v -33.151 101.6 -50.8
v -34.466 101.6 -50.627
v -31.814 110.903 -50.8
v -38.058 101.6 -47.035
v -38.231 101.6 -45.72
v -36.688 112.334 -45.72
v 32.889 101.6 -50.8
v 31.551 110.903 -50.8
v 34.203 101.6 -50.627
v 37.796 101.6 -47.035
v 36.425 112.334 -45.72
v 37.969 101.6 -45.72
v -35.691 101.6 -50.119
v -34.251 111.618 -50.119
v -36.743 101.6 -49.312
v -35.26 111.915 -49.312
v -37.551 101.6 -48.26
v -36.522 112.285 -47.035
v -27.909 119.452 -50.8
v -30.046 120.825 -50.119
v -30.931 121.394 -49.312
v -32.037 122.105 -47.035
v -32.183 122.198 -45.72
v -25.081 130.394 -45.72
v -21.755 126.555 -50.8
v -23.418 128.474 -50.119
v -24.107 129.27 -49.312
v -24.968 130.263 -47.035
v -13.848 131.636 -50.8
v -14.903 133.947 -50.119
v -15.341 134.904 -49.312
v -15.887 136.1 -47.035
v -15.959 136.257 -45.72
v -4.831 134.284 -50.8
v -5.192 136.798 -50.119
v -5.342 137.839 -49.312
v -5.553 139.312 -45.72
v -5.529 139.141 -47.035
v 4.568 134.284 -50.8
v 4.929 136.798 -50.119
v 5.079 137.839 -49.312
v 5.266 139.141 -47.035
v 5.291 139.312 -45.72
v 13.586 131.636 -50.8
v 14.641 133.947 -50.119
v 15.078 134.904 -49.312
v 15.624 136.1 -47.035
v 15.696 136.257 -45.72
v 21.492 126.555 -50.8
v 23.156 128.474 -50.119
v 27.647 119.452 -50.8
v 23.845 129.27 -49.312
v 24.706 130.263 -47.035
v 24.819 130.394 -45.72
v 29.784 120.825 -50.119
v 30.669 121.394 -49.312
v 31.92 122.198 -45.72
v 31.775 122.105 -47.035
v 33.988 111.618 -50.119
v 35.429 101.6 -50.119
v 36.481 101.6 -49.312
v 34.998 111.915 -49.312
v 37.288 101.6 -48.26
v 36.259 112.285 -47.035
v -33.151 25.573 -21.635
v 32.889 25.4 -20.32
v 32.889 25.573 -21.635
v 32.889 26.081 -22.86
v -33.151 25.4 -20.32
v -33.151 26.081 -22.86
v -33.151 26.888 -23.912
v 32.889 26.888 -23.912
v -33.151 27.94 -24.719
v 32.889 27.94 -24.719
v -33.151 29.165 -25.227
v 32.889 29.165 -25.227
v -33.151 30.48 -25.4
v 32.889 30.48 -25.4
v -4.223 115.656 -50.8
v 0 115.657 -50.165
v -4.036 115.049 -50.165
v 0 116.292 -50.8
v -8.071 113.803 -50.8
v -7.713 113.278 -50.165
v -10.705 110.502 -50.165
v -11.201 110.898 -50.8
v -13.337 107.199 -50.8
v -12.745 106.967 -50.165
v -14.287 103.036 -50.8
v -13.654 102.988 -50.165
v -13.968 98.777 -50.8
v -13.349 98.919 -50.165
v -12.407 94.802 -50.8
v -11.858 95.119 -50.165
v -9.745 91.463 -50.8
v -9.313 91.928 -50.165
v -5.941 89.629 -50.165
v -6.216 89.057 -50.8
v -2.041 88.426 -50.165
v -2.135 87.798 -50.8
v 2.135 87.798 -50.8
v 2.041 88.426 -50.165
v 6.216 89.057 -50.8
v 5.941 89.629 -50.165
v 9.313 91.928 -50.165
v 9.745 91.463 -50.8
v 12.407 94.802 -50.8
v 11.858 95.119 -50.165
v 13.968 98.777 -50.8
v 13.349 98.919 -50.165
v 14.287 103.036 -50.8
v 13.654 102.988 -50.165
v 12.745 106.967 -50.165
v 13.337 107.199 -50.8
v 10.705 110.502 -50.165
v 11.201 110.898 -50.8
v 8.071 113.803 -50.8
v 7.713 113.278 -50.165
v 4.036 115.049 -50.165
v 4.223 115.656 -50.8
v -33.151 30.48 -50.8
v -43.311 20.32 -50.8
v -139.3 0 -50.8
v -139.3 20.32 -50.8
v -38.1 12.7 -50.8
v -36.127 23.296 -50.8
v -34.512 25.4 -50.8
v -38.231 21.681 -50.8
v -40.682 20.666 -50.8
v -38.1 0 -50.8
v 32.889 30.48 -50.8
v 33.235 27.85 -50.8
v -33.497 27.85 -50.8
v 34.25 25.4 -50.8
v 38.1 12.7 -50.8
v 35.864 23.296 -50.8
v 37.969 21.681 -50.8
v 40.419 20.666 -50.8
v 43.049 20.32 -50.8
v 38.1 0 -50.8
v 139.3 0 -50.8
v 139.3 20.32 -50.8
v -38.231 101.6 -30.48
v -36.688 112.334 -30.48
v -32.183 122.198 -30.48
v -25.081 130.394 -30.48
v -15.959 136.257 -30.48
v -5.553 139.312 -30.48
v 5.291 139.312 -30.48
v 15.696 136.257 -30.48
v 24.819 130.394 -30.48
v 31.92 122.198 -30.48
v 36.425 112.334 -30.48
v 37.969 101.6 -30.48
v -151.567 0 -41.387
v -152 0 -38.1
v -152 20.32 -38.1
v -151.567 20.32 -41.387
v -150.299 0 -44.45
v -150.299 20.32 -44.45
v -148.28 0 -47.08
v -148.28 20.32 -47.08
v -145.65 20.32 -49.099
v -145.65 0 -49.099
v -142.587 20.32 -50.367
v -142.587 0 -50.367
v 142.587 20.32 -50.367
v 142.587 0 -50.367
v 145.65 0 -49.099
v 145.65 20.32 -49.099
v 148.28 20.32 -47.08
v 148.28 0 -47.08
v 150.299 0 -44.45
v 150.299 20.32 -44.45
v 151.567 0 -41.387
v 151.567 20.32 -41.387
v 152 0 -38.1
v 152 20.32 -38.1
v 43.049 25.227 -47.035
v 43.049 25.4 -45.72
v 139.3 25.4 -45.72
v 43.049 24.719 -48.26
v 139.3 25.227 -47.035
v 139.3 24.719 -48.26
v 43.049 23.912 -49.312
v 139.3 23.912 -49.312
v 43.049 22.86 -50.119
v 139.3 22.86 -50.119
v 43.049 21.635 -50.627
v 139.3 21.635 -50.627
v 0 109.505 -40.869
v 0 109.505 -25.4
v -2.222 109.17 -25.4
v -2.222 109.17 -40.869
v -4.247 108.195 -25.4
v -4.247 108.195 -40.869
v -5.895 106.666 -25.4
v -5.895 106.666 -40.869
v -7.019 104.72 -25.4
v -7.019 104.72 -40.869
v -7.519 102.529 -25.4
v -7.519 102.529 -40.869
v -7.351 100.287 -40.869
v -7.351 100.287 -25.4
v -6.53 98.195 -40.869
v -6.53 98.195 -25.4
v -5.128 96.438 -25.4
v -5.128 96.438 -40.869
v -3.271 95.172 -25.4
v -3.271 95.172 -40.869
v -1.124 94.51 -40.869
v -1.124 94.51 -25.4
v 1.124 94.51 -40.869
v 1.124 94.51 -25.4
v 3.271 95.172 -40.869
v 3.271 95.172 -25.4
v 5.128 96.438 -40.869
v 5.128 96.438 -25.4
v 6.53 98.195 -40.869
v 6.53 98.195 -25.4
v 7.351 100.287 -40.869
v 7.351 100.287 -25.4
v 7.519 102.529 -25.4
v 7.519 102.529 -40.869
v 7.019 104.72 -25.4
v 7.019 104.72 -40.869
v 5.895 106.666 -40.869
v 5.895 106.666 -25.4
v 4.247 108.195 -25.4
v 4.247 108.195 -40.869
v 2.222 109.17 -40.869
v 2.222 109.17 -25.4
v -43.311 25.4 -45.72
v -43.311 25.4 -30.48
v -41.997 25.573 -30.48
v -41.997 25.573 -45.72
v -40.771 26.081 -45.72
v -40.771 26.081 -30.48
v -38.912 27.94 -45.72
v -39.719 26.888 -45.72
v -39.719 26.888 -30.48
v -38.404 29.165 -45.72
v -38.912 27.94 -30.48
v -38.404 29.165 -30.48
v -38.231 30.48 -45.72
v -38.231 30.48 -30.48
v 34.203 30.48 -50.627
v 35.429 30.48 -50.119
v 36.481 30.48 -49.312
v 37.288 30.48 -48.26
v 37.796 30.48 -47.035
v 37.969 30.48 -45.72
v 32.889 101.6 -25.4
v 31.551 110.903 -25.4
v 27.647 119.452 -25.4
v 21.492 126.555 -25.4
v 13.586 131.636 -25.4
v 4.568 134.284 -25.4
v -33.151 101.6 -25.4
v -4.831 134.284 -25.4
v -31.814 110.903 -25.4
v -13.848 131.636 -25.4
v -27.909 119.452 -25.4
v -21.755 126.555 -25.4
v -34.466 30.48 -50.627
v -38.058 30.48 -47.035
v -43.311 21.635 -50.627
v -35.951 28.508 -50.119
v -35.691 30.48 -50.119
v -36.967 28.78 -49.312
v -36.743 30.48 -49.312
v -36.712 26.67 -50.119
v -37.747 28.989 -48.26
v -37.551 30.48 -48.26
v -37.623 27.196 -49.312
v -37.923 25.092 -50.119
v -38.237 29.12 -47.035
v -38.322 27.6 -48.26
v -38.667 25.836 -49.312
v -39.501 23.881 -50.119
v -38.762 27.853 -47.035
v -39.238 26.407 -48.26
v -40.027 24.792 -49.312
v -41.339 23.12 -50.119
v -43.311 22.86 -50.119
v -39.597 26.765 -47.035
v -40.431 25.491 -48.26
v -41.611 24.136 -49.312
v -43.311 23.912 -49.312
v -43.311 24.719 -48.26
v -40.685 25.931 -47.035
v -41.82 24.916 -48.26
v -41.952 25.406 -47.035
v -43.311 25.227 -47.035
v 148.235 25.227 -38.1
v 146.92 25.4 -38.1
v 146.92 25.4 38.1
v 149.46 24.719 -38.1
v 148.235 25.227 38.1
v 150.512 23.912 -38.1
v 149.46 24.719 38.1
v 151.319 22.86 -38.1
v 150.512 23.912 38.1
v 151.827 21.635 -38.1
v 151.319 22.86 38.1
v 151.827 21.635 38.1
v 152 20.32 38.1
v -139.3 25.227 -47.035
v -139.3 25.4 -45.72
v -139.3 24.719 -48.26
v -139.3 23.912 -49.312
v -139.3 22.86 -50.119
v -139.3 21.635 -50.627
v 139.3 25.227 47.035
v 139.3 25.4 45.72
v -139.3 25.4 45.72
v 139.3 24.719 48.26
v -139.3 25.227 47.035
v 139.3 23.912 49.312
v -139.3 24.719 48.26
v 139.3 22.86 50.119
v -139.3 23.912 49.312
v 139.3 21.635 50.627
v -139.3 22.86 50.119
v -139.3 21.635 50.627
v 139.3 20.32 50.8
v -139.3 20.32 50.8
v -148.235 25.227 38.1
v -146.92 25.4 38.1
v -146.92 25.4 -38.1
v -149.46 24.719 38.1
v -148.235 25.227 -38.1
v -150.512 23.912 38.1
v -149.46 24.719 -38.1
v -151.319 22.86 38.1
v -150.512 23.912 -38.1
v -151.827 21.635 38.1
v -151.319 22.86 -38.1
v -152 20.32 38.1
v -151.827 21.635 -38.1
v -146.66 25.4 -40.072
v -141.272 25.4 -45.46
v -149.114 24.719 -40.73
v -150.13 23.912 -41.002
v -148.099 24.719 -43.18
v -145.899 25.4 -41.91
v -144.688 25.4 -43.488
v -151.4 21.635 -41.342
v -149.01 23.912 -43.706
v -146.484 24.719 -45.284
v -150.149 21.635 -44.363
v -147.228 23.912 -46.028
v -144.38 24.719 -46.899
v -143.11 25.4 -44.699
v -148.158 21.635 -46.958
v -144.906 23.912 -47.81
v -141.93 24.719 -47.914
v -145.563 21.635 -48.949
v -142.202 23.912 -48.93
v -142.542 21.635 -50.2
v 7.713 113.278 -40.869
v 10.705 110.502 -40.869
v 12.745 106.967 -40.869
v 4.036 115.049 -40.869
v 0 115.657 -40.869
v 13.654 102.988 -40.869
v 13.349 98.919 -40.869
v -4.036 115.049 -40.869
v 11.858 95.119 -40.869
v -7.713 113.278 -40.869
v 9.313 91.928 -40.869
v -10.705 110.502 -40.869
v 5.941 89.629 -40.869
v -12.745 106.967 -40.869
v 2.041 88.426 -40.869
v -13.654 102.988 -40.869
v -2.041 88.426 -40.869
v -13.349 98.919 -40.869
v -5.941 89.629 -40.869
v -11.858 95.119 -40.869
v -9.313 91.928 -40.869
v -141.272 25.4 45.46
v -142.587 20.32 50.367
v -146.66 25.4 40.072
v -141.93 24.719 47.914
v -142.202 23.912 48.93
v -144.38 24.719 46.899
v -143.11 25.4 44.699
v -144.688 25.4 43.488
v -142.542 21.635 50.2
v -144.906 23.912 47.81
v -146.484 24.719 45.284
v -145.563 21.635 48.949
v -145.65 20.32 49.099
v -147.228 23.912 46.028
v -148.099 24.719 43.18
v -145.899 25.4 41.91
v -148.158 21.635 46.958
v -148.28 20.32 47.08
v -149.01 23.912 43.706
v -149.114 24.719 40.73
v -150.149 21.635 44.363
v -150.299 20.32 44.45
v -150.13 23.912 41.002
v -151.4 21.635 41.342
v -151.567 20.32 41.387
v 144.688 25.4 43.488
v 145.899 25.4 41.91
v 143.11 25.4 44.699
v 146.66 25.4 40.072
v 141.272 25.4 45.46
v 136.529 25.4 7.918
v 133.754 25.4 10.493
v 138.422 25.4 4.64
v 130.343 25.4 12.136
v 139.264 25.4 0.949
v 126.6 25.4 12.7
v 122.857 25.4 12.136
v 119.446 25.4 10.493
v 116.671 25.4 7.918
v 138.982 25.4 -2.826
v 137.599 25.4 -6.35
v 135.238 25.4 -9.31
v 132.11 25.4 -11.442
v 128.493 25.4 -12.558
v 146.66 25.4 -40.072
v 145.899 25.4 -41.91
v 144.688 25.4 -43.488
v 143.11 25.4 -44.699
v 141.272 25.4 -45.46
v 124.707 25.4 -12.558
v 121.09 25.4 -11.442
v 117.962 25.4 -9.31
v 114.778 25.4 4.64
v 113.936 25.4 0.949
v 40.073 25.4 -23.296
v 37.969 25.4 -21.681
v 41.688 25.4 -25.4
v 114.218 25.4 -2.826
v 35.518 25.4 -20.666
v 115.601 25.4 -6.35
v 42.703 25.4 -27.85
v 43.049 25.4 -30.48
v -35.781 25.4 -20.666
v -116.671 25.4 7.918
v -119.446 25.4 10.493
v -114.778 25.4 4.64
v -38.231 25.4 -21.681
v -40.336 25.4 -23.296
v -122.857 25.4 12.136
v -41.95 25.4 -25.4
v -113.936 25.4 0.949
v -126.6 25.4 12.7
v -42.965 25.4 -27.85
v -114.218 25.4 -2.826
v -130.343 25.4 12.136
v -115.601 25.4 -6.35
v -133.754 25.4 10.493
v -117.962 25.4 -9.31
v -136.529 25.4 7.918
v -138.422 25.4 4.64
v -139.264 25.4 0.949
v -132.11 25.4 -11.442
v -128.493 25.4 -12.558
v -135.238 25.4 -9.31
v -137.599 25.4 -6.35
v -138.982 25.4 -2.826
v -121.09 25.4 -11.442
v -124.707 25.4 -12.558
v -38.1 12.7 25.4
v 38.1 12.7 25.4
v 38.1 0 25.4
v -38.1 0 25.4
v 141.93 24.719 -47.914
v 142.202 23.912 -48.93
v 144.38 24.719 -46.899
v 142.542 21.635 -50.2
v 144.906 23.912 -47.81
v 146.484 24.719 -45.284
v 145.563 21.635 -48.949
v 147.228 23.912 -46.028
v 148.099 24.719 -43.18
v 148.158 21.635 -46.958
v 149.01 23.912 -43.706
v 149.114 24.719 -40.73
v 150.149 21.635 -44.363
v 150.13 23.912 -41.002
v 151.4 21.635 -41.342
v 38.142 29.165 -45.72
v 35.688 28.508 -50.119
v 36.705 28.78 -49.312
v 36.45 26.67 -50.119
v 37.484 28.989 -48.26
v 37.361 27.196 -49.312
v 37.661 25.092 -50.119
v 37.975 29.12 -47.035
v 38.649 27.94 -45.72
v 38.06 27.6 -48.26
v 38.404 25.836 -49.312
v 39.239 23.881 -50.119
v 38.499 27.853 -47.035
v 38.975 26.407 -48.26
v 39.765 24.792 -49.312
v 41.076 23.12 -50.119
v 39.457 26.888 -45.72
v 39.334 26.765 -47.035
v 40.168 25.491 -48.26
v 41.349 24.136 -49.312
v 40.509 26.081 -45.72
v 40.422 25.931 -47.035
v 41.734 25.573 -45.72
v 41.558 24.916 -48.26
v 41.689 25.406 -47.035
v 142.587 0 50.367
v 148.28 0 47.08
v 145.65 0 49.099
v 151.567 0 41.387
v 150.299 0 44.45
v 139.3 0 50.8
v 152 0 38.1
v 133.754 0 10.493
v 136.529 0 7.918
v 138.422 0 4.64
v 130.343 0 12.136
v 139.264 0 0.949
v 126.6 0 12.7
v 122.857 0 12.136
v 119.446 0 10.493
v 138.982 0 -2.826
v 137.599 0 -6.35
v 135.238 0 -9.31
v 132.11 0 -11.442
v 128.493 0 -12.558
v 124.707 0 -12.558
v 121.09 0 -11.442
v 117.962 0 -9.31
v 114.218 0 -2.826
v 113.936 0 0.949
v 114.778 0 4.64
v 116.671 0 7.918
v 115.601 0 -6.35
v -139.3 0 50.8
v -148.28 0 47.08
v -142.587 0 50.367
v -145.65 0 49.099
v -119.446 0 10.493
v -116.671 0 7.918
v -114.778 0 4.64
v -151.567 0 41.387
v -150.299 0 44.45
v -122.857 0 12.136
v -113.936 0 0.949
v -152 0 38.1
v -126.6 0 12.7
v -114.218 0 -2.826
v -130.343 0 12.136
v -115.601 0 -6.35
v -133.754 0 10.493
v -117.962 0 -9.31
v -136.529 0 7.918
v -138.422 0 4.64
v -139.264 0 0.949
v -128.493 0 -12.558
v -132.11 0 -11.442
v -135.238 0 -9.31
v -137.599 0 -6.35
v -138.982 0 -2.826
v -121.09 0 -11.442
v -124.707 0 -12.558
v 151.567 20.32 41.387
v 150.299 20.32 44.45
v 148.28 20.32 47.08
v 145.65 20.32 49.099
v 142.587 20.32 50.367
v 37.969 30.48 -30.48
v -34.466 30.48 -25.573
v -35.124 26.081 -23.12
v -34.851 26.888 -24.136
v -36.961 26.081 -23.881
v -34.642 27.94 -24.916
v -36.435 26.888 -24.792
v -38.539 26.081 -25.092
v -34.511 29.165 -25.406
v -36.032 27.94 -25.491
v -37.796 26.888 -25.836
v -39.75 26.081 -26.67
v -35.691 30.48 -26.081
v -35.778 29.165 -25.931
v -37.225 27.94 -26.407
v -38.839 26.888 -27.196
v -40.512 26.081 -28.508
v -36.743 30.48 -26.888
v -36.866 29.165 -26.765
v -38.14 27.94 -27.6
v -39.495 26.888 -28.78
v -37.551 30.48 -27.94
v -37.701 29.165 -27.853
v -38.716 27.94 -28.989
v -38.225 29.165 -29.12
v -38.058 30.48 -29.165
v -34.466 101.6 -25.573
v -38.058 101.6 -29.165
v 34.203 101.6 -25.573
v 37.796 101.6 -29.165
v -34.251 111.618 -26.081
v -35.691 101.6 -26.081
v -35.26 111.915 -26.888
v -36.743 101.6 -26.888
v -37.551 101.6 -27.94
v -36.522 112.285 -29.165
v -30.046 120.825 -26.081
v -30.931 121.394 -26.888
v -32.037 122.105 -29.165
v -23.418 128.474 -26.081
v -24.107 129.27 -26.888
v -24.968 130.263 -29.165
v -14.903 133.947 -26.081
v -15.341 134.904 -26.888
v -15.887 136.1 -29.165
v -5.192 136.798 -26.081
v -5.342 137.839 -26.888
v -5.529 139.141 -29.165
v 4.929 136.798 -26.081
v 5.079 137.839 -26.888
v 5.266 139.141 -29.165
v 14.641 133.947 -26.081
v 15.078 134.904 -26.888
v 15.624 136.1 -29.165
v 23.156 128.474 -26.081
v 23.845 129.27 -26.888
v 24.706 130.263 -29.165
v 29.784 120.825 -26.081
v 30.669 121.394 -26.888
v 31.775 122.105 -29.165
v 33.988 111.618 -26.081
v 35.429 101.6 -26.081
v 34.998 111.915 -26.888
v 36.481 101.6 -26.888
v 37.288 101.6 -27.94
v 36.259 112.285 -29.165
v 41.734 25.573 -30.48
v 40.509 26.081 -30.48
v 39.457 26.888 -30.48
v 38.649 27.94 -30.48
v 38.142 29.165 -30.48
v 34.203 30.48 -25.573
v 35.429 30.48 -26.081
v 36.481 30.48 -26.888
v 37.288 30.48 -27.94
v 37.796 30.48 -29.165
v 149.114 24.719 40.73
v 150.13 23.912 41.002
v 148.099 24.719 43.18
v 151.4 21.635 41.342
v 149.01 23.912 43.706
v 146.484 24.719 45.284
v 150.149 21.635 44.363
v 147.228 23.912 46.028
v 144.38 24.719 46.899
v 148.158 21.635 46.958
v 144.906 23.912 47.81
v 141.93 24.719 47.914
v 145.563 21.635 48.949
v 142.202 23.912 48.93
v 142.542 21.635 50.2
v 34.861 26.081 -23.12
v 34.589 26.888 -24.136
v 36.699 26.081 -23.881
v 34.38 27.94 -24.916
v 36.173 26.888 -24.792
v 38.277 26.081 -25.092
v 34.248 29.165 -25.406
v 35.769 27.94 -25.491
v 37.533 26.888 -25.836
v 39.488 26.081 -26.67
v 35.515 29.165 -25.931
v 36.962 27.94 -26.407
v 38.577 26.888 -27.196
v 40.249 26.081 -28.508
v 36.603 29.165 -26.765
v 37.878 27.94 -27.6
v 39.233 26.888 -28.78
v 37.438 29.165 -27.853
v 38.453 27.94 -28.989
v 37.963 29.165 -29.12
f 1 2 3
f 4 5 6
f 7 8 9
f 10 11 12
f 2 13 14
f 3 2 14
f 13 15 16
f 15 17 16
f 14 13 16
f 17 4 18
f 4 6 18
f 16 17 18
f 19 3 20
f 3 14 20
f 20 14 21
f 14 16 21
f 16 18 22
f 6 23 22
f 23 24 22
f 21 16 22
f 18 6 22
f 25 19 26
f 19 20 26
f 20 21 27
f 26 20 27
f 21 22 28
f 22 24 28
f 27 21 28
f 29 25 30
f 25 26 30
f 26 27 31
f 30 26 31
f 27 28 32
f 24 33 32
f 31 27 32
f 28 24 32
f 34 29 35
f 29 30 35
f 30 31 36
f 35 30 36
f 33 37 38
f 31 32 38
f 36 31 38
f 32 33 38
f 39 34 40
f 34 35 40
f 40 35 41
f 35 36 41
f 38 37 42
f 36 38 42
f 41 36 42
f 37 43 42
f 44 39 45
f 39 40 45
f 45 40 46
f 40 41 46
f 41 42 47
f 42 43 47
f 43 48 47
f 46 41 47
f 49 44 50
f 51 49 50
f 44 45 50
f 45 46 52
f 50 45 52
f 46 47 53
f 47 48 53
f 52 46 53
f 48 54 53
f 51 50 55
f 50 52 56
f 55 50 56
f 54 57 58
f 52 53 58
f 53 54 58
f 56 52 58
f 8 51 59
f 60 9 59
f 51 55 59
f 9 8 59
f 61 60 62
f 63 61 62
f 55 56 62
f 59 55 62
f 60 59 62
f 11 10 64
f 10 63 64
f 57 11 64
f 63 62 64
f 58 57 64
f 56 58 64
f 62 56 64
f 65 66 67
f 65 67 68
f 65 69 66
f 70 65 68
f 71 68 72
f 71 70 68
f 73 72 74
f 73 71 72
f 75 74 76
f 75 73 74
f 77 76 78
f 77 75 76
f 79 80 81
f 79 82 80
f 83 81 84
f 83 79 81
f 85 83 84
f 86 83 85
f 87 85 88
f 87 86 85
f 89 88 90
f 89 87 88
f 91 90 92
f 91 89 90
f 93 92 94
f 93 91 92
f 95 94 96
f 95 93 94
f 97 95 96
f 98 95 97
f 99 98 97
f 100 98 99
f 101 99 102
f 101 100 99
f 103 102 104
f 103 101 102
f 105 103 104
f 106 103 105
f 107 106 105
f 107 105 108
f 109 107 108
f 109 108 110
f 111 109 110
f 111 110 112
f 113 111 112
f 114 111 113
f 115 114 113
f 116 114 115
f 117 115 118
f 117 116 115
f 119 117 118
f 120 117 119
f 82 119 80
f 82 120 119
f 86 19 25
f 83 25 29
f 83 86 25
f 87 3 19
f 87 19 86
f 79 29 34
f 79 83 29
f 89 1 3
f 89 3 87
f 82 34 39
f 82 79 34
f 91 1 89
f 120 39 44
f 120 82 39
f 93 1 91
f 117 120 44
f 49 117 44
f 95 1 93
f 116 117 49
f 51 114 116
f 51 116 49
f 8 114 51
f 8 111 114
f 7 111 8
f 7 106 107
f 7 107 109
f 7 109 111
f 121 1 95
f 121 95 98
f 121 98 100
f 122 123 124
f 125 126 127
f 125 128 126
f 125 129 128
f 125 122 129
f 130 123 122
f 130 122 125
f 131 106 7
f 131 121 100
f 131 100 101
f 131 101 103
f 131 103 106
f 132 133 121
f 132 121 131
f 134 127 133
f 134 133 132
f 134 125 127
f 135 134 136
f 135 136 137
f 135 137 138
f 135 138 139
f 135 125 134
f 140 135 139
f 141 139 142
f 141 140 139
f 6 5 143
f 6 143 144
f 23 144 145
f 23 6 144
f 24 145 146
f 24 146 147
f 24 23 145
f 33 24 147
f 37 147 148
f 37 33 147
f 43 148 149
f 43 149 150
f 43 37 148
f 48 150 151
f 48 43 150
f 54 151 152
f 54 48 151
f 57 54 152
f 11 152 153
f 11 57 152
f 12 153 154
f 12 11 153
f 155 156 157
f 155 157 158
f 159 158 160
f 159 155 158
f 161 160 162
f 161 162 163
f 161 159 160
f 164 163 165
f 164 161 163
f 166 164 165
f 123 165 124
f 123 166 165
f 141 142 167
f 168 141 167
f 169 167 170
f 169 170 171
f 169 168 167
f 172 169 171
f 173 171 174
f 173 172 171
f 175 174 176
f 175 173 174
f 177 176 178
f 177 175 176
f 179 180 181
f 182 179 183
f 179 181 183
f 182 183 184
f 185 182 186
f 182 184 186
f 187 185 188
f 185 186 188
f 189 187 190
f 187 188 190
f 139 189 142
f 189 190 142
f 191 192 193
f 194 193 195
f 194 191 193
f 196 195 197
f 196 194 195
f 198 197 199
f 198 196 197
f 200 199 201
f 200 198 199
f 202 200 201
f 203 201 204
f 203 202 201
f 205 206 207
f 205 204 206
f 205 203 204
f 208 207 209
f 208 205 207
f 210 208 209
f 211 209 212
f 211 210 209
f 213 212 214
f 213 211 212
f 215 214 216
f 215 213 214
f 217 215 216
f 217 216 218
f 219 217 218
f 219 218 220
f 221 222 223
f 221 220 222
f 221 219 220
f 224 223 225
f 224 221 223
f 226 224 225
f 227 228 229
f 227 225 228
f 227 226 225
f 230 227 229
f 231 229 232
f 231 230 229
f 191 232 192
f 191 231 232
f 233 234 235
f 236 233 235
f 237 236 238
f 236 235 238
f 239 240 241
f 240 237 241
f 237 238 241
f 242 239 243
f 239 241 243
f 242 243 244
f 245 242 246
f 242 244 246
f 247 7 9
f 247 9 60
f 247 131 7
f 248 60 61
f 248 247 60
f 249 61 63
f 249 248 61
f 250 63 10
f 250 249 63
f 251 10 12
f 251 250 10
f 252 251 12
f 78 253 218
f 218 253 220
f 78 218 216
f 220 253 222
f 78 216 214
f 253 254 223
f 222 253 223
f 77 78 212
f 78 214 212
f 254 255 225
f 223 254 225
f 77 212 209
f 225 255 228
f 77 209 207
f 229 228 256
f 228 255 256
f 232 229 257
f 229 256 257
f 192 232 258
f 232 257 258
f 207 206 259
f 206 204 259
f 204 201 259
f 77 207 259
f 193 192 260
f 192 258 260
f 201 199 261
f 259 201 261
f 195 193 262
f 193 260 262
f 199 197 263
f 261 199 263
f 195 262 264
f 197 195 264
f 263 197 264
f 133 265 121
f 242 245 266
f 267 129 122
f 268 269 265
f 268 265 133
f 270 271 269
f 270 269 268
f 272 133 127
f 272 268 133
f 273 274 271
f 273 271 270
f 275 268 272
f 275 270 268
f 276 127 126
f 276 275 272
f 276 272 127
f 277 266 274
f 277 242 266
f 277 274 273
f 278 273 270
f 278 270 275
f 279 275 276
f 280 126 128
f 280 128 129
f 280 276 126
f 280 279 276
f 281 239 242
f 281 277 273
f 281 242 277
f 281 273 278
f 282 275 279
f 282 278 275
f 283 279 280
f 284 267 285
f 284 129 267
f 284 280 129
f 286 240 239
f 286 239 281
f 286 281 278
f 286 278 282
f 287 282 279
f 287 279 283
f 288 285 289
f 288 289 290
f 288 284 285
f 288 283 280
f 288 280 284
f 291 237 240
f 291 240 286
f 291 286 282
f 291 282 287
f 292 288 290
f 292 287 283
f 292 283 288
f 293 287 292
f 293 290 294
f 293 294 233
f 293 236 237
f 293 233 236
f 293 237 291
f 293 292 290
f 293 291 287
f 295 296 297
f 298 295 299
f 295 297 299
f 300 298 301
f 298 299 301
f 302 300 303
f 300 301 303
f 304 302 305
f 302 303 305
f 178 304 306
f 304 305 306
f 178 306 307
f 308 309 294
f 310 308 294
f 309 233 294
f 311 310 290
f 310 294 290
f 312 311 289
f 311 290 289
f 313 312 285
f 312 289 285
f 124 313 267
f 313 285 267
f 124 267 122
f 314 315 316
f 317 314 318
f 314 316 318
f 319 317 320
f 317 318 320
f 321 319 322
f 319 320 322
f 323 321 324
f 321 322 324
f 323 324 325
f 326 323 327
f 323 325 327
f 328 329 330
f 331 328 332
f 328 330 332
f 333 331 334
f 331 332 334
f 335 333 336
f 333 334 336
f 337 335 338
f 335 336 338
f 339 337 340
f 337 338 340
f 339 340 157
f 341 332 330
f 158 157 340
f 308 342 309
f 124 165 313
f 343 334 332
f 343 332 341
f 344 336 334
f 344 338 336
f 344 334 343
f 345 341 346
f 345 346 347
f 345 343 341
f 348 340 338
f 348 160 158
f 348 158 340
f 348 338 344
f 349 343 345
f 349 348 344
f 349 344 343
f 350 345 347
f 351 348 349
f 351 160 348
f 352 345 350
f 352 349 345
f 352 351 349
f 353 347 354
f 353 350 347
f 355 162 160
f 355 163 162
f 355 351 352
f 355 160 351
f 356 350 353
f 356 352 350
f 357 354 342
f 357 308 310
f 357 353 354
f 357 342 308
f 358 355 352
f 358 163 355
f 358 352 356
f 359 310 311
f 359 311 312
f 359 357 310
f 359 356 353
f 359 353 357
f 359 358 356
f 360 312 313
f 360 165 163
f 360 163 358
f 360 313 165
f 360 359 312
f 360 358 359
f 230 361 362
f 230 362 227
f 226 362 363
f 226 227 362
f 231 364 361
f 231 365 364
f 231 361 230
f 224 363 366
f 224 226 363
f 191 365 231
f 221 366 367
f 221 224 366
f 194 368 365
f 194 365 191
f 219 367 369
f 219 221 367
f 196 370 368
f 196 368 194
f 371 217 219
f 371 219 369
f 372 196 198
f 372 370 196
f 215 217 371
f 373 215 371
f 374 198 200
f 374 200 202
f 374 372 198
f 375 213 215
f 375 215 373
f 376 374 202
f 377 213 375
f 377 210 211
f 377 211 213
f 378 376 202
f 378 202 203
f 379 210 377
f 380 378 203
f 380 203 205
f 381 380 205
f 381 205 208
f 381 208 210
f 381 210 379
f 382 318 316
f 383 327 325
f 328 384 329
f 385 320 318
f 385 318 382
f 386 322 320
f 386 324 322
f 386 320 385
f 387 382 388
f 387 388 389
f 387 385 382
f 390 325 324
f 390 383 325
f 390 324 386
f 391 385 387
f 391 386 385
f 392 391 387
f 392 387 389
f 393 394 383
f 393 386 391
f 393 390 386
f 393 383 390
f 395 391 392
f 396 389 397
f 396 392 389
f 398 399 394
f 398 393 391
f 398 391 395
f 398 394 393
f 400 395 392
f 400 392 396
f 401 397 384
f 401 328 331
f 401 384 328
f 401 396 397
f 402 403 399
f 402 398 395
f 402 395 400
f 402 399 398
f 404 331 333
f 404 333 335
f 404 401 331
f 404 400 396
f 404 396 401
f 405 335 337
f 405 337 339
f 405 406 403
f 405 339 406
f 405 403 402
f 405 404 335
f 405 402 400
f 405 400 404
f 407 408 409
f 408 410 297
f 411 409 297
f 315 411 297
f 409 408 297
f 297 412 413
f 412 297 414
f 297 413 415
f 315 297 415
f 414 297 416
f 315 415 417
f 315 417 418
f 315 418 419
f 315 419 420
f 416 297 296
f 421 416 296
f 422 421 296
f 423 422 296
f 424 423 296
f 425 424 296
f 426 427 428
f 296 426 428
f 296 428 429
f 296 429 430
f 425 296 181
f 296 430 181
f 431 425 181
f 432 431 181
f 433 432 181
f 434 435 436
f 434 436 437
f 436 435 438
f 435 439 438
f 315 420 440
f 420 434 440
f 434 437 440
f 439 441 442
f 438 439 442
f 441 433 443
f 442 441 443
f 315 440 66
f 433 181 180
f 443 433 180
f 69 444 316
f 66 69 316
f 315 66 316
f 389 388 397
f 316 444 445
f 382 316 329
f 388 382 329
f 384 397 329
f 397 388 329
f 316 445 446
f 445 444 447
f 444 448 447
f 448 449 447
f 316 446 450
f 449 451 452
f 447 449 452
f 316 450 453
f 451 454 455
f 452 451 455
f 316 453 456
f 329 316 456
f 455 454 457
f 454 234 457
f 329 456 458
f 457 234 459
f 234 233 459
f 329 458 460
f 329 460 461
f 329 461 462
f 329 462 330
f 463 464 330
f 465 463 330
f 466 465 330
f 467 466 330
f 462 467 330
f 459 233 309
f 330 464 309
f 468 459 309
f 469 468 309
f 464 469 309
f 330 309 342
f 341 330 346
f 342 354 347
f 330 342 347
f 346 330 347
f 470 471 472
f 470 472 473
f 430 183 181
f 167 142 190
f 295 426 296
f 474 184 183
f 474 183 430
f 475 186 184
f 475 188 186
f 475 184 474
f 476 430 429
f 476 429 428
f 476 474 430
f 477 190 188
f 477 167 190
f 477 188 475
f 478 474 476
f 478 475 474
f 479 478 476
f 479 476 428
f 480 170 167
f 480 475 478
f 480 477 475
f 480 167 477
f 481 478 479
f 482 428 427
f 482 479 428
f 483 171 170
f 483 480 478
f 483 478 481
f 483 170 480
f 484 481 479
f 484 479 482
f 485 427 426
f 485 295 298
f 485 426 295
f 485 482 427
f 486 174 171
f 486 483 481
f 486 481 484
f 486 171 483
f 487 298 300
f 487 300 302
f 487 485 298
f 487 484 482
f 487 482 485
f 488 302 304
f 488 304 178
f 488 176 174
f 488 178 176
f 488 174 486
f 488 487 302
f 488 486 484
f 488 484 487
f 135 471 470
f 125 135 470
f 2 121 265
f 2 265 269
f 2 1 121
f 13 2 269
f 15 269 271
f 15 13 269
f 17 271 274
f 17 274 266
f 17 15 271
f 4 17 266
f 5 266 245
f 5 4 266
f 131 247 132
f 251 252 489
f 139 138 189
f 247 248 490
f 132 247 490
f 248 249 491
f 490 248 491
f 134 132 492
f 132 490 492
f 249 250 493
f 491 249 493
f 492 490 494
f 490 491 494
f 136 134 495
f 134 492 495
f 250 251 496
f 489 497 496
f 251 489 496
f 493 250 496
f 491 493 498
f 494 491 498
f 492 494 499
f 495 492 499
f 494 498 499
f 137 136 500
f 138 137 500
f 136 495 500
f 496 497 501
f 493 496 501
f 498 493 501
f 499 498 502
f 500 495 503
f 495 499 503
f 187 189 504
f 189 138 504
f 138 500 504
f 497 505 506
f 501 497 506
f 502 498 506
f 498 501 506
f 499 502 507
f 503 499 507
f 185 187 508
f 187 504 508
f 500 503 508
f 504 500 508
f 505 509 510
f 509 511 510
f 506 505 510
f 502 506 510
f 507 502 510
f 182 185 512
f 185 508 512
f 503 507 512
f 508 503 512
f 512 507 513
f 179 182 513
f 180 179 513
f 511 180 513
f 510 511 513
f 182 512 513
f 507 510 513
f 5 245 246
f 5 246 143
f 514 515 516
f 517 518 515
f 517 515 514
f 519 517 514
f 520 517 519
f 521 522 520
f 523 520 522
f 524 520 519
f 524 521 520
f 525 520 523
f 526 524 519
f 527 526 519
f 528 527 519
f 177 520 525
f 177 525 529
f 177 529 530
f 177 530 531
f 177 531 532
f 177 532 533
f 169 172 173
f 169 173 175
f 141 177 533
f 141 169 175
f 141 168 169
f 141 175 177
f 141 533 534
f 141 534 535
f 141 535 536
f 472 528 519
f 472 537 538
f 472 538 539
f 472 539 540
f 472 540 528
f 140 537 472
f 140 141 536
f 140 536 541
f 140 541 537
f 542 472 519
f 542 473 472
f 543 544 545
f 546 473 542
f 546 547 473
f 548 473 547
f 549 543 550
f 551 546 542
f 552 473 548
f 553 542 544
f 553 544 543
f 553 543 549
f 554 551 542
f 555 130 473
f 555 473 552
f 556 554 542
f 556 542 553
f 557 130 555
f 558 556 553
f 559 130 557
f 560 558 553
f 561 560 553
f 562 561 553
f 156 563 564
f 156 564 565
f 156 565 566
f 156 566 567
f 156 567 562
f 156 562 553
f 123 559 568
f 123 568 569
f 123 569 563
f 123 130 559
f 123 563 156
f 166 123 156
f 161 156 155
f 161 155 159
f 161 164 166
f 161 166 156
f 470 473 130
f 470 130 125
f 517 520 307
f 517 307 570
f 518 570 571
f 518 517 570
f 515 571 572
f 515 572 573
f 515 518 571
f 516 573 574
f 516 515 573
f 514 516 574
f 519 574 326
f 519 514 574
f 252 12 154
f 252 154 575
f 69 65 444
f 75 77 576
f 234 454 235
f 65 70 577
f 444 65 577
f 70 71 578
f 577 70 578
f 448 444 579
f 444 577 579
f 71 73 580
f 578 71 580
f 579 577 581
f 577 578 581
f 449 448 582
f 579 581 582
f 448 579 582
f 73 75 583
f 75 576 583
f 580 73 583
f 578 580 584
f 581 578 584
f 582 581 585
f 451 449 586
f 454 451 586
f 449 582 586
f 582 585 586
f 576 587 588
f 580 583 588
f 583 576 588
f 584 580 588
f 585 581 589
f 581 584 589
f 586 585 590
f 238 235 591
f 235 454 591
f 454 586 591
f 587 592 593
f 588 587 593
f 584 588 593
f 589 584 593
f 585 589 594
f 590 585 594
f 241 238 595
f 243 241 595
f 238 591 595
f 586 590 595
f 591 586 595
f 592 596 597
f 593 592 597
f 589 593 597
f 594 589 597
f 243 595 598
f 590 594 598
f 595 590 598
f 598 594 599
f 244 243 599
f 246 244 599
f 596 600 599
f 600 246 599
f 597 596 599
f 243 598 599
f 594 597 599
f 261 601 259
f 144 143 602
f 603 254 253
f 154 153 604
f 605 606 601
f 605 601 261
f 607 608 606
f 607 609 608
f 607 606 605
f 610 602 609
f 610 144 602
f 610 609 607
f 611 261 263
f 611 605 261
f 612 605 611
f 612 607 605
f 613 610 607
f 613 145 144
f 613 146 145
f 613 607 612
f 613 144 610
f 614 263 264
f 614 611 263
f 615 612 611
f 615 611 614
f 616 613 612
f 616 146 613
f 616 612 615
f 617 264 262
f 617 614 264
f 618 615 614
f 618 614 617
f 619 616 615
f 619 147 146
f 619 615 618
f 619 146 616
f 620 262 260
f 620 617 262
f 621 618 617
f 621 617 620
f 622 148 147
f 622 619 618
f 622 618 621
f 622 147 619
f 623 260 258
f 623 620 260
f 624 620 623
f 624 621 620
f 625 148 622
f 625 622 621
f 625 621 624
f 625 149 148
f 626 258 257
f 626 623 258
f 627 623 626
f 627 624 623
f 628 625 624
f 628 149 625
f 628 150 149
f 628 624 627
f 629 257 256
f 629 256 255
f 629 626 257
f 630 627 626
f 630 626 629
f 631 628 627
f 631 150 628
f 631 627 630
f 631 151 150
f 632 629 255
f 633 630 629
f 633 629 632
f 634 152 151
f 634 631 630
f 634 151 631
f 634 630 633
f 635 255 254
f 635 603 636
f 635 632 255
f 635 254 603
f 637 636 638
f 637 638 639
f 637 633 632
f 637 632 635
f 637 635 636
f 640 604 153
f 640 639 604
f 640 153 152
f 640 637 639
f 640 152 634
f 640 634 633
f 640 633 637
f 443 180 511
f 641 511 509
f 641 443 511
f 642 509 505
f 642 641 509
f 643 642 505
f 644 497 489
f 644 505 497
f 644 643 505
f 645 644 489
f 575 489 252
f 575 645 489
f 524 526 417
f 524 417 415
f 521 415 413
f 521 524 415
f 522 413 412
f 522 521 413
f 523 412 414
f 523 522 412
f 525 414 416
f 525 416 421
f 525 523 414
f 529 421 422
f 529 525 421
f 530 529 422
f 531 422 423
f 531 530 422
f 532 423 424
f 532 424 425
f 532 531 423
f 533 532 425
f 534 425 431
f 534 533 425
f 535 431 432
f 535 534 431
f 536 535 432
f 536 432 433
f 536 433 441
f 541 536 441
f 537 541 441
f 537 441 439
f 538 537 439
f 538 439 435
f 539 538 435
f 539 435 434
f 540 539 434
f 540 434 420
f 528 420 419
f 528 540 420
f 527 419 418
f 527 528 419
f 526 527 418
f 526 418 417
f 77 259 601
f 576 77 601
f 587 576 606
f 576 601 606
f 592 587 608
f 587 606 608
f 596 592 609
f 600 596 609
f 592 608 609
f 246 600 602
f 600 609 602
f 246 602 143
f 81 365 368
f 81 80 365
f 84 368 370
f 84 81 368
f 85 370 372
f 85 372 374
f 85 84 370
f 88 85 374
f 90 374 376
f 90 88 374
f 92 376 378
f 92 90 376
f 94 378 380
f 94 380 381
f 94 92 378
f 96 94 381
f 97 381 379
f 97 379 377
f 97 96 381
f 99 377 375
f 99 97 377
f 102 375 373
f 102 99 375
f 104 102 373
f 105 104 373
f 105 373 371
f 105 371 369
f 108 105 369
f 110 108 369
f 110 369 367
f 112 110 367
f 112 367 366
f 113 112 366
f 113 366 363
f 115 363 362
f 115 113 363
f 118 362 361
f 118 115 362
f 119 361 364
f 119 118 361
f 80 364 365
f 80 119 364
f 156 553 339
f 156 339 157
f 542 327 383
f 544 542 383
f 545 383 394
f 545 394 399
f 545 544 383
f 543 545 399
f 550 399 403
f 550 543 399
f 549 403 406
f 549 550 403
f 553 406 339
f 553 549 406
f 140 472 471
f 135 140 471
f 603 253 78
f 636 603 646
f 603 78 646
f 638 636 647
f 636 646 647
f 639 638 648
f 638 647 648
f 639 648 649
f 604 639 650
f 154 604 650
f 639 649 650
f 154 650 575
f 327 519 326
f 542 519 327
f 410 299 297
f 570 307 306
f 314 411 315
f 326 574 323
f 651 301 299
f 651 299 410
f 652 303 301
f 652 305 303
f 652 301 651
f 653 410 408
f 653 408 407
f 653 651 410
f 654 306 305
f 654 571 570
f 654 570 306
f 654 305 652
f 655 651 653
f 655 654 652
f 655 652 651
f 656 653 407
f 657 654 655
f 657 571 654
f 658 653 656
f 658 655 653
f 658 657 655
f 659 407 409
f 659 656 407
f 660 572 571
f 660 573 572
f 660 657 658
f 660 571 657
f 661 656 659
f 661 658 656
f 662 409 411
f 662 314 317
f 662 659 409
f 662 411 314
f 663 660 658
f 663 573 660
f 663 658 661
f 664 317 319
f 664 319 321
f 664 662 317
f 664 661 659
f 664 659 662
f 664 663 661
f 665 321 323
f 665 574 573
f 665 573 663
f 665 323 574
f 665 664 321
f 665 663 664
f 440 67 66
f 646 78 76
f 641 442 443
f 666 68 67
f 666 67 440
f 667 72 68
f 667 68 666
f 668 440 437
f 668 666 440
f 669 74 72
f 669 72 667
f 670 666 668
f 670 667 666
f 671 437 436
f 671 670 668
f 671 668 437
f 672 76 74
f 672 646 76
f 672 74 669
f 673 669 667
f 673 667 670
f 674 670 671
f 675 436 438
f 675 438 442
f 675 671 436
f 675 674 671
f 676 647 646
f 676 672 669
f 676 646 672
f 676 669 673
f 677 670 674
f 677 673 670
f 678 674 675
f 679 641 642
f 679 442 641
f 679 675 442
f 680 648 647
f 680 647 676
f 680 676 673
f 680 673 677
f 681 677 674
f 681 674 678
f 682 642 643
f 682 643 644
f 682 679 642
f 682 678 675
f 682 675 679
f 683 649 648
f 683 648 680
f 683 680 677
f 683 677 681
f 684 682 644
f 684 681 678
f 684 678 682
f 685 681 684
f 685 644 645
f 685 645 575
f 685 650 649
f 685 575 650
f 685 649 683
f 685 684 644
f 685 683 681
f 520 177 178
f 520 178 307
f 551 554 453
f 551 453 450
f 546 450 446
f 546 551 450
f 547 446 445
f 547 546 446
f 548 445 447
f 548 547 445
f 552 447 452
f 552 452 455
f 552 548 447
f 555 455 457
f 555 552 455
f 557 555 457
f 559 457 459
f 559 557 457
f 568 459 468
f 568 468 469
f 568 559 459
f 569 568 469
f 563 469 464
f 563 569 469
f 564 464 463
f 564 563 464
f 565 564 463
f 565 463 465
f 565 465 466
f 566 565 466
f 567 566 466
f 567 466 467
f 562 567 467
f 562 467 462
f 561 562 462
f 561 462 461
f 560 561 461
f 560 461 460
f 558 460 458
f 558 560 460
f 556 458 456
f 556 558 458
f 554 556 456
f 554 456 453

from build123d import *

# Parameters (mm, degrees)
CROQUIS2_R                 = 12.7
SALIENTE_EXTRUIR1_DEPTH    = 25.4
CORTAR_EXTRUIR1_DEPTH      = 185.585264851
CORTAR_EXTRUIR1_DEPTH_BACK = 76.2
CROQUIS7_W                 = 76.2
CROQUIS7_H                 = 12.7
SALIENTE_EXTRUIR2_DEPTH    = 25.4
REDONDEO1_R                = 5.08


with BuildPart() as part:
    # Croquis2 → Saliente-Extruir1 (new body)
    with BuildSketch(Plane(origin=(0, 0, 0), x_dir=(1, 0, 0), z_dir=(0, 1, 0))):
        with BuildLine():
            Line((139.3, -50.8), (-139.3, -50.8))
            ThreePointArc((-139.3, -50.8), (-148.280256121, -47.080256121), (-152, -38.1))
            Line((-152, -38.1), (-152, 38.1))
            ThreePointArc((-152, 38.1), (-148.280256121, 47.080256121), (-139.3, 50.8))
            Line((-139.3, 50.8), (139.3, 50.8))
            ThreePointArc((139.3, 50.8), (148.280256121, 47.080256121), (152, 38.1))
            Line((152, 38.1), (152, -38.1))
            ThreePointArc((152, -38.1), (148.280256121, -47.080256121), (139.3, -50.8))
        make_face()
        with Locations(Location((-126.6, 0, 0), (0, 0, 270))):
            Circle(CROQUIS2_R, mode=Mode.SUBTRACT)
        with Locations(Location((126.6, 0, 0), (0, 0, 270))):
            Circle(CROQUIS2_R, mode=Mode.SUBTRACT)
    extrude(amount=SALIENTE_EXTRUIR1_DEPTH)

    # Croquis7 → Cortar-Extruir1 (cut, two sides: drawn at the far end of the back side and taken through both)
    with BuildSketch(Plane(origin=(0, 0, -50.8), x_dir=(-1, 0, 0), z_dir=(0, 0, -1)).offset(-CORTAR_EXTRUIR1_DEPTH_BACK)):
        with Locations((0, 6.35)):
            Rectangle(CROQUIS7_W, CROQUIS7_H)
    extrude(amount=CORTAR_EXTRUIR1_DEPTH + CORTAR_EXTRUIR1_DEPTH_BACK, mode=Mode.SUBTRACT)

    # Croquis9 → Saliente-Extruir2 (add)
    with BuildSketch(Plane(origin=(0, 0, -50.8), x_dir=(-1, 0, 0), z_dir=(0, 0, -1))):
        with BuildLine():
            Line((-37.968696545, 101.6), (-37.968696545, 25.4))
            Line((-37.968696545, 25.4), (38.231303455, 25.4))
            Line((38.231303455, 25.4), (38.231303455, 101.6))
            ThreePointArc((38.231303455, 101.6), (0.131303455, 139.7), (-37.968696545, 101.6))
        make_face()
    extrude(amount=-SALIENTE_EXTRUIR2_DEPTH)

    # Croquis11 → Refrentado para tornillo con cabeza troncocónica de 9/162 (revolve, cut)
    with BuildSketch(Plane(origin=(0, 101.965288162, -50.8), x_dir=(0, 1, 0), z_dir=(1, 0, 0))):
        Polygon((0, 0), (0, 101.6), (7.53999, 101.6), (7.53999, 9.9314), (13.69187, 9.9314), (13.69187, 0.635), (14.32687, 0), align=None)
    revolve(axis=Axis((0, 101.965288162, -57.15), (0, 0, 1)), mode=Mode.SUBTRACT)

    # Redondeo1
    redondeo1_edges = [part.edges().sort_by_distance(p)[0] for p in [
        (148.280256121, 25.4, -47.080256121),
        (88.634348272, 25.4, -50.8),
        (-148.280256121, 25.4, -47.080256121),
        (-152, 25.4, 0),
        (-148.280256121, 25.4, 47.080256121),
        (0, 25.4, 50.8),
        (-88.765651728, 25.4, -50.8),
        (-38.231303455, 63.5, -25.4),
        (-0.131303455, 25.4, -25.4),
        (-38.231303455, 25.4, -38.1),
        (37.968696545, 63.5, -25.4),
        (37.968696545, 25.4, -38.1),
        (-0.131303455, 139.7, -25.4),
        (-38.231303455, 63.5, -50.8),
        (-0.131303455, 139.7, -50.8),
        (37.968696545, 63.5, -50.8),
        (148.280256121, 25.4, 47.080256121),
        (152, 25.4, 0),
    ]]
    fillet(redondeo1_edges, radius=REDONDEO1_R)


solid = part.part
